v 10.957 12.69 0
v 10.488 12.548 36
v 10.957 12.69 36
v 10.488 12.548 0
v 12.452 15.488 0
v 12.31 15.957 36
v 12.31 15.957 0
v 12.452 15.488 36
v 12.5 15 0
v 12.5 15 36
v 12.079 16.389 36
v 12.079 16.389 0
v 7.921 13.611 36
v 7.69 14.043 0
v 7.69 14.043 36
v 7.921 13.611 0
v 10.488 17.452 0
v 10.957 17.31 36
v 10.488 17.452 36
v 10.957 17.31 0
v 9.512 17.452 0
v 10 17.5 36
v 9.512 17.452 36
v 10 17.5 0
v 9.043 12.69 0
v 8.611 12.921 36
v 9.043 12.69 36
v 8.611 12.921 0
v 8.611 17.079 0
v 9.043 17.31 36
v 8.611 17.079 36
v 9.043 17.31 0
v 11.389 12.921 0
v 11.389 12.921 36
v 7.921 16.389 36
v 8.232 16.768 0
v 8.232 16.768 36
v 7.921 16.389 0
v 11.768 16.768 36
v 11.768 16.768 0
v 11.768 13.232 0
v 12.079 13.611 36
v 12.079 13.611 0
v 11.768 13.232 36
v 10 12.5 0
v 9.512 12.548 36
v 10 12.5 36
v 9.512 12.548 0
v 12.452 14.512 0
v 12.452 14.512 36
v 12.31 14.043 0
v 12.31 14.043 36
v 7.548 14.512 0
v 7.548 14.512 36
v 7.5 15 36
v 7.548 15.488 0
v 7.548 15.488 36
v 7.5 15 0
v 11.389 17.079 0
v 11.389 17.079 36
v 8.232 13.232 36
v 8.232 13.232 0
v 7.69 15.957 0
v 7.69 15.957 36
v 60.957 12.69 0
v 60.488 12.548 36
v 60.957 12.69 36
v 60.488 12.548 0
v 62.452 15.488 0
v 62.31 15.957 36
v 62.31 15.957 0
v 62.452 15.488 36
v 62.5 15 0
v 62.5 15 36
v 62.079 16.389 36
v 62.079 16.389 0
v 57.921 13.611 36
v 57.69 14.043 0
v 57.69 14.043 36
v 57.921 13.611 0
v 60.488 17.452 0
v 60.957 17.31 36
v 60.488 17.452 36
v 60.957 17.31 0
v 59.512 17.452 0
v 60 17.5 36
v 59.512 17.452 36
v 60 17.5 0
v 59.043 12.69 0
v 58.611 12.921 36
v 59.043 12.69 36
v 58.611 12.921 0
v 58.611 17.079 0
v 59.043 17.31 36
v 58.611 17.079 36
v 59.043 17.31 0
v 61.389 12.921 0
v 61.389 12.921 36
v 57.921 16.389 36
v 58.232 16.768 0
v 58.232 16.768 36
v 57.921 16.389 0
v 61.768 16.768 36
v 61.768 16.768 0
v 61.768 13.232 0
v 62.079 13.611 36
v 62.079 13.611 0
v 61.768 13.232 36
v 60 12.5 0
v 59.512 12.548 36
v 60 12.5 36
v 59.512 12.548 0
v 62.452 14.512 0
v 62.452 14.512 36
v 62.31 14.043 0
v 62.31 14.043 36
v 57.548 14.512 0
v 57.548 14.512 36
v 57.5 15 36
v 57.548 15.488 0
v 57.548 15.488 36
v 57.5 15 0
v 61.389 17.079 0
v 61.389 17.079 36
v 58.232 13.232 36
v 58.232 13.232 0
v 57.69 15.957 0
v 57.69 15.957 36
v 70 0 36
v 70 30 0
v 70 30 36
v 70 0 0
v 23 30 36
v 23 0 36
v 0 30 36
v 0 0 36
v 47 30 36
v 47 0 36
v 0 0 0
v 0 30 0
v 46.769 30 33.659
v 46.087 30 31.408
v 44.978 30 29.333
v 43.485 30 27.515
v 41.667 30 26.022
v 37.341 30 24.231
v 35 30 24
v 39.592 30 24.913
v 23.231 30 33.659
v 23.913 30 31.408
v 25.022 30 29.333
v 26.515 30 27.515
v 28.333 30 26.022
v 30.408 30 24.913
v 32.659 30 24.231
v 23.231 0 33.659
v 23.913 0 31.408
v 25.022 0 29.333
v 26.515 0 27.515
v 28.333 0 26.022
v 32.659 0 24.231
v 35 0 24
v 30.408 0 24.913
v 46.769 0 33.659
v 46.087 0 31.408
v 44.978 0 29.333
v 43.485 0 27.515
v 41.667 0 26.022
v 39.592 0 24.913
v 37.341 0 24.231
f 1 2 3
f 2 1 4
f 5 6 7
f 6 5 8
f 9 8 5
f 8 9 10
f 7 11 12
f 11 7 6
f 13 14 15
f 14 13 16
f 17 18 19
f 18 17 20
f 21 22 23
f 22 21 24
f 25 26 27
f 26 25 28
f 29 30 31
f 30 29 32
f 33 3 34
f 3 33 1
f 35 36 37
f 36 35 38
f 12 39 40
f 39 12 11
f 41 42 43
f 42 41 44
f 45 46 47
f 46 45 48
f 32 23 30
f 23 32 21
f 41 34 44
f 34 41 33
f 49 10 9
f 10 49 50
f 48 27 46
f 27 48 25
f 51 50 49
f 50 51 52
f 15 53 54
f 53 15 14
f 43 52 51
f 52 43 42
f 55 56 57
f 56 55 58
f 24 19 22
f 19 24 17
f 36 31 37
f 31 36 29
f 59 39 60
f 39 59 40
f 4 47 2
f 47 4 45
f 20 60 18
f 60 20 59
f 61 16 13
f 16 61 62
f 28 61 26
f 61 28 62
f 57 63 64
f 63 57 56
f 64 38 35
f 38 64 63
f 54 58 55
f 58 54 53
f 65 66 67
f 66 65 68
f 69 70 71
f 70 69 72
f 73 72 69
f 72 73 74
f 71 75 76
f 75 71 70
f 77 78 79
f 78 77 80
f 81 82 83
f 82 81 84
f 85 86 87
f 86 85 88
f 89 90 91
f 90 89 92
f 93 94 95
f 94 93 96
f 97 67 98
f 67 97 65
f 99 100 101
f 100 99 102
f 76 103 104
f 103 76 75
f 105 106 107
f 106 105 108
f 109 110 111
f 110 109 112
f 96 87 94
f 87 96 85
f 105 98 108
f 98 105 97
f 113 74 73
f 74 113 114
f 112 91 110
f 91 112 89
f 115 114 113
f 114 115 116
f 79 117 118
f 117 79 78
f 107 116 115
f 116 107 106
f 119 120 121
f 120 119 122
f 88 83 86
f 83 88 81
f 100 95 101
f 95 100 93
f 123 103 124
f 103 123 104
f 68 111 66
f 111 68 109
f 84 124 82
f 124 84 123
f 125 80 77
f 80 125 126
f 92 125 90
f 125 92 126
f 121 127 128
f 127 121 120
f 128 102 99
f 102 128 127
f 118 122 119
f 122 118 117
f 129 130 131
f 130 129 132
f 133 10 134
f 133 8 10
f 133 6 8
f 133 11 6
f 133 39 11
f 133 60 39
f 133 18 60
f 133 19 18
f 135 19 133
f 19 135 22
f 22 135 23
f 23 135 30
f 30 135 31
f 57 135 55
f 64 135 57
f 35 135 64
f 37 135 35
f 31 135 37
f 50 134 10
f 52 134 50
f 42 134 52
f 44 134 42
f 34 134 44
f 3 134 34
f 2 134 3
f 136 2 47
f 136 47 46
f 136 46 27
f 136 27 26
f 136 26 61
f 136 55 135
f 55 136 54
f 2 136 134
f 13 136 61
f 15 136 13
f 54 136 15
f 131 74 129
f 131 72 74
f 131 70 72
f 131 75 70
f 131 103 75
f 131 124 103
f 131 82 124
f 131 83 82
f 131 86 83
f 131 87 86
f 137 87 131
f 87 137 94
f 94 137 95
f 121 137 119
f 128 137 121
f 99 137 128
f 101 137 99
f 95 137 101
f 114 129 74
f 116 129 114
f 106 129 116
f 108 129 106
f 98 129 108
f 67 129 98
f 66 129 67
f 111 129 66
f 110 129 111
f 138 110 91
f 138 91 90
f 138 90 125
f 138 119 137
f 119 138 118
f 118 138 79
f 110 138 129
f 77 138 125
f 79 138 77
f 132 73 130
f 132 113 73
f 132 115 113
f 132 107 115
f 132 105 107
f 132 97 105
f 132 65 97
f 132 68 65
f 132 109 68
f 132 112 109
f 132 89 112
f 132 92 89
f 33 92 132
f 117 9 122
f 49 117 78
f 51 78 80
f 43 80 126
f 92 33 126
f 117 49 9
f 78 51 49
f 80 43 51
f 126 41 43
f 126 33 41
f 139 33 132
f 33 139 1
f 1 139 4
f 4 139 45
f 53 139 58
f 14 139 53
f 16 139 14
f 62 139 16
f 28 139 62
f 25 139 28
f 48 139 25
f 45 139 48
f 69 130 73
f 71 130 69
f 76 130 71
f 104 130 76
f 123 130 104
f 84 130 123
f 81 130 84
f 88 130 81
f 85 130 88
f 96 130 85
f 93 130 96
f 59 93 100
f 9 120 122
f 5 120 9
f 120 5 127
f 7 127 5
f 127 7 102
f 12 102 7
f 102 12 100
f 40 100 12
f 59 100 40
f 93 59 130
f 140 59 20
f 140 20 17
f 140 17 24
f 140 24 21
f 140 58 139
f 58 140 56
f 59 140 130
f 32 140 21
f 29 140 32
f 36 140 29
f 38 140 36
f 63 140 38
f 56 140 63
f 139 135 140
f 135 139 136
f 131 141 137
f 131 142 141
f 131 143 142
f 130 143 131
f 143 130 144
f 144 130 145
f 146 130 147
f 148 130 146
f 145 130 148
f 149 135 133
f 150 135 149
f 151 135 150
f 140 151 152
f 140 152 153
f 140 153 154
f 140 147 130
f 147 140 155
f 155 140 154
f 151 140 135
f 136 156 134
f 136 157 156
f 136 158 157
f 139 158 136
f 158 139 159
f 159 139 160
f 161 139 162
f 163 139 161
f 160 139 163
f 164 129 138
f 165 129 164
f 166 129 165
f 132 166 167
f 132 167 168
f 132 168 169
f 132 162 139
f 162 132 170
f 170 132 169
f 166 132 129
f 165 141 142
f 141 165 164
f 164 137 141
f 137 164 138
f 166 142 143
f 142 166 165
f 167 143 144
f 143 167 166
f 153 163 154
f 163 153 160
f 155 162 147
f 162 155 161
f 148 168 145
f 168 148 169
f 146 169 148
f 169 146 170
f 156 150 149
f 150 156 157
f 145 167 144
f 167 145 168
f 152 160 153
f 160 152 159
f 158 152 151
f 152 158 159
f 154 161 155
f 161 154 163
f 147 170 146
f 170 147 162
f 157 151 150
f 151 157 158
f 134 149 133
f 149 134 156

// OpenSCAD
$fn = 32;

// ----------------------------------------------------------------------
// Saddle clamp: plain shaft clamp
// ----------------------------------------------------------------------

// --- parameters (mm) ---
blk_l = 70;               // block length, X
blk_w = 30;               // block width, Y
blk_h = 36;               // block height
clamp_r = 12;             // shaft groove radius
hole_r = 2.5;             // bolt hole radius
hole_m = 10;              // bolt hole margin from the ends

saw_depth = clamp_r + 3;  // saw kerf depth

difference() {
  cube([blk_l, blk_w, blk_h]);
  translate([blk_l / 2, -1, blk_h])
    rotate([-90, 0, 0])
      cylinder(h = blk_w + 2, r = clamp_r);
  for (sx = [0, 1])
    translate([sx ? blk_l - hole_m : hole_m, blk_w / 2, -1])
      cylinder(r = hole_r, h = blk_h + 2);
}
